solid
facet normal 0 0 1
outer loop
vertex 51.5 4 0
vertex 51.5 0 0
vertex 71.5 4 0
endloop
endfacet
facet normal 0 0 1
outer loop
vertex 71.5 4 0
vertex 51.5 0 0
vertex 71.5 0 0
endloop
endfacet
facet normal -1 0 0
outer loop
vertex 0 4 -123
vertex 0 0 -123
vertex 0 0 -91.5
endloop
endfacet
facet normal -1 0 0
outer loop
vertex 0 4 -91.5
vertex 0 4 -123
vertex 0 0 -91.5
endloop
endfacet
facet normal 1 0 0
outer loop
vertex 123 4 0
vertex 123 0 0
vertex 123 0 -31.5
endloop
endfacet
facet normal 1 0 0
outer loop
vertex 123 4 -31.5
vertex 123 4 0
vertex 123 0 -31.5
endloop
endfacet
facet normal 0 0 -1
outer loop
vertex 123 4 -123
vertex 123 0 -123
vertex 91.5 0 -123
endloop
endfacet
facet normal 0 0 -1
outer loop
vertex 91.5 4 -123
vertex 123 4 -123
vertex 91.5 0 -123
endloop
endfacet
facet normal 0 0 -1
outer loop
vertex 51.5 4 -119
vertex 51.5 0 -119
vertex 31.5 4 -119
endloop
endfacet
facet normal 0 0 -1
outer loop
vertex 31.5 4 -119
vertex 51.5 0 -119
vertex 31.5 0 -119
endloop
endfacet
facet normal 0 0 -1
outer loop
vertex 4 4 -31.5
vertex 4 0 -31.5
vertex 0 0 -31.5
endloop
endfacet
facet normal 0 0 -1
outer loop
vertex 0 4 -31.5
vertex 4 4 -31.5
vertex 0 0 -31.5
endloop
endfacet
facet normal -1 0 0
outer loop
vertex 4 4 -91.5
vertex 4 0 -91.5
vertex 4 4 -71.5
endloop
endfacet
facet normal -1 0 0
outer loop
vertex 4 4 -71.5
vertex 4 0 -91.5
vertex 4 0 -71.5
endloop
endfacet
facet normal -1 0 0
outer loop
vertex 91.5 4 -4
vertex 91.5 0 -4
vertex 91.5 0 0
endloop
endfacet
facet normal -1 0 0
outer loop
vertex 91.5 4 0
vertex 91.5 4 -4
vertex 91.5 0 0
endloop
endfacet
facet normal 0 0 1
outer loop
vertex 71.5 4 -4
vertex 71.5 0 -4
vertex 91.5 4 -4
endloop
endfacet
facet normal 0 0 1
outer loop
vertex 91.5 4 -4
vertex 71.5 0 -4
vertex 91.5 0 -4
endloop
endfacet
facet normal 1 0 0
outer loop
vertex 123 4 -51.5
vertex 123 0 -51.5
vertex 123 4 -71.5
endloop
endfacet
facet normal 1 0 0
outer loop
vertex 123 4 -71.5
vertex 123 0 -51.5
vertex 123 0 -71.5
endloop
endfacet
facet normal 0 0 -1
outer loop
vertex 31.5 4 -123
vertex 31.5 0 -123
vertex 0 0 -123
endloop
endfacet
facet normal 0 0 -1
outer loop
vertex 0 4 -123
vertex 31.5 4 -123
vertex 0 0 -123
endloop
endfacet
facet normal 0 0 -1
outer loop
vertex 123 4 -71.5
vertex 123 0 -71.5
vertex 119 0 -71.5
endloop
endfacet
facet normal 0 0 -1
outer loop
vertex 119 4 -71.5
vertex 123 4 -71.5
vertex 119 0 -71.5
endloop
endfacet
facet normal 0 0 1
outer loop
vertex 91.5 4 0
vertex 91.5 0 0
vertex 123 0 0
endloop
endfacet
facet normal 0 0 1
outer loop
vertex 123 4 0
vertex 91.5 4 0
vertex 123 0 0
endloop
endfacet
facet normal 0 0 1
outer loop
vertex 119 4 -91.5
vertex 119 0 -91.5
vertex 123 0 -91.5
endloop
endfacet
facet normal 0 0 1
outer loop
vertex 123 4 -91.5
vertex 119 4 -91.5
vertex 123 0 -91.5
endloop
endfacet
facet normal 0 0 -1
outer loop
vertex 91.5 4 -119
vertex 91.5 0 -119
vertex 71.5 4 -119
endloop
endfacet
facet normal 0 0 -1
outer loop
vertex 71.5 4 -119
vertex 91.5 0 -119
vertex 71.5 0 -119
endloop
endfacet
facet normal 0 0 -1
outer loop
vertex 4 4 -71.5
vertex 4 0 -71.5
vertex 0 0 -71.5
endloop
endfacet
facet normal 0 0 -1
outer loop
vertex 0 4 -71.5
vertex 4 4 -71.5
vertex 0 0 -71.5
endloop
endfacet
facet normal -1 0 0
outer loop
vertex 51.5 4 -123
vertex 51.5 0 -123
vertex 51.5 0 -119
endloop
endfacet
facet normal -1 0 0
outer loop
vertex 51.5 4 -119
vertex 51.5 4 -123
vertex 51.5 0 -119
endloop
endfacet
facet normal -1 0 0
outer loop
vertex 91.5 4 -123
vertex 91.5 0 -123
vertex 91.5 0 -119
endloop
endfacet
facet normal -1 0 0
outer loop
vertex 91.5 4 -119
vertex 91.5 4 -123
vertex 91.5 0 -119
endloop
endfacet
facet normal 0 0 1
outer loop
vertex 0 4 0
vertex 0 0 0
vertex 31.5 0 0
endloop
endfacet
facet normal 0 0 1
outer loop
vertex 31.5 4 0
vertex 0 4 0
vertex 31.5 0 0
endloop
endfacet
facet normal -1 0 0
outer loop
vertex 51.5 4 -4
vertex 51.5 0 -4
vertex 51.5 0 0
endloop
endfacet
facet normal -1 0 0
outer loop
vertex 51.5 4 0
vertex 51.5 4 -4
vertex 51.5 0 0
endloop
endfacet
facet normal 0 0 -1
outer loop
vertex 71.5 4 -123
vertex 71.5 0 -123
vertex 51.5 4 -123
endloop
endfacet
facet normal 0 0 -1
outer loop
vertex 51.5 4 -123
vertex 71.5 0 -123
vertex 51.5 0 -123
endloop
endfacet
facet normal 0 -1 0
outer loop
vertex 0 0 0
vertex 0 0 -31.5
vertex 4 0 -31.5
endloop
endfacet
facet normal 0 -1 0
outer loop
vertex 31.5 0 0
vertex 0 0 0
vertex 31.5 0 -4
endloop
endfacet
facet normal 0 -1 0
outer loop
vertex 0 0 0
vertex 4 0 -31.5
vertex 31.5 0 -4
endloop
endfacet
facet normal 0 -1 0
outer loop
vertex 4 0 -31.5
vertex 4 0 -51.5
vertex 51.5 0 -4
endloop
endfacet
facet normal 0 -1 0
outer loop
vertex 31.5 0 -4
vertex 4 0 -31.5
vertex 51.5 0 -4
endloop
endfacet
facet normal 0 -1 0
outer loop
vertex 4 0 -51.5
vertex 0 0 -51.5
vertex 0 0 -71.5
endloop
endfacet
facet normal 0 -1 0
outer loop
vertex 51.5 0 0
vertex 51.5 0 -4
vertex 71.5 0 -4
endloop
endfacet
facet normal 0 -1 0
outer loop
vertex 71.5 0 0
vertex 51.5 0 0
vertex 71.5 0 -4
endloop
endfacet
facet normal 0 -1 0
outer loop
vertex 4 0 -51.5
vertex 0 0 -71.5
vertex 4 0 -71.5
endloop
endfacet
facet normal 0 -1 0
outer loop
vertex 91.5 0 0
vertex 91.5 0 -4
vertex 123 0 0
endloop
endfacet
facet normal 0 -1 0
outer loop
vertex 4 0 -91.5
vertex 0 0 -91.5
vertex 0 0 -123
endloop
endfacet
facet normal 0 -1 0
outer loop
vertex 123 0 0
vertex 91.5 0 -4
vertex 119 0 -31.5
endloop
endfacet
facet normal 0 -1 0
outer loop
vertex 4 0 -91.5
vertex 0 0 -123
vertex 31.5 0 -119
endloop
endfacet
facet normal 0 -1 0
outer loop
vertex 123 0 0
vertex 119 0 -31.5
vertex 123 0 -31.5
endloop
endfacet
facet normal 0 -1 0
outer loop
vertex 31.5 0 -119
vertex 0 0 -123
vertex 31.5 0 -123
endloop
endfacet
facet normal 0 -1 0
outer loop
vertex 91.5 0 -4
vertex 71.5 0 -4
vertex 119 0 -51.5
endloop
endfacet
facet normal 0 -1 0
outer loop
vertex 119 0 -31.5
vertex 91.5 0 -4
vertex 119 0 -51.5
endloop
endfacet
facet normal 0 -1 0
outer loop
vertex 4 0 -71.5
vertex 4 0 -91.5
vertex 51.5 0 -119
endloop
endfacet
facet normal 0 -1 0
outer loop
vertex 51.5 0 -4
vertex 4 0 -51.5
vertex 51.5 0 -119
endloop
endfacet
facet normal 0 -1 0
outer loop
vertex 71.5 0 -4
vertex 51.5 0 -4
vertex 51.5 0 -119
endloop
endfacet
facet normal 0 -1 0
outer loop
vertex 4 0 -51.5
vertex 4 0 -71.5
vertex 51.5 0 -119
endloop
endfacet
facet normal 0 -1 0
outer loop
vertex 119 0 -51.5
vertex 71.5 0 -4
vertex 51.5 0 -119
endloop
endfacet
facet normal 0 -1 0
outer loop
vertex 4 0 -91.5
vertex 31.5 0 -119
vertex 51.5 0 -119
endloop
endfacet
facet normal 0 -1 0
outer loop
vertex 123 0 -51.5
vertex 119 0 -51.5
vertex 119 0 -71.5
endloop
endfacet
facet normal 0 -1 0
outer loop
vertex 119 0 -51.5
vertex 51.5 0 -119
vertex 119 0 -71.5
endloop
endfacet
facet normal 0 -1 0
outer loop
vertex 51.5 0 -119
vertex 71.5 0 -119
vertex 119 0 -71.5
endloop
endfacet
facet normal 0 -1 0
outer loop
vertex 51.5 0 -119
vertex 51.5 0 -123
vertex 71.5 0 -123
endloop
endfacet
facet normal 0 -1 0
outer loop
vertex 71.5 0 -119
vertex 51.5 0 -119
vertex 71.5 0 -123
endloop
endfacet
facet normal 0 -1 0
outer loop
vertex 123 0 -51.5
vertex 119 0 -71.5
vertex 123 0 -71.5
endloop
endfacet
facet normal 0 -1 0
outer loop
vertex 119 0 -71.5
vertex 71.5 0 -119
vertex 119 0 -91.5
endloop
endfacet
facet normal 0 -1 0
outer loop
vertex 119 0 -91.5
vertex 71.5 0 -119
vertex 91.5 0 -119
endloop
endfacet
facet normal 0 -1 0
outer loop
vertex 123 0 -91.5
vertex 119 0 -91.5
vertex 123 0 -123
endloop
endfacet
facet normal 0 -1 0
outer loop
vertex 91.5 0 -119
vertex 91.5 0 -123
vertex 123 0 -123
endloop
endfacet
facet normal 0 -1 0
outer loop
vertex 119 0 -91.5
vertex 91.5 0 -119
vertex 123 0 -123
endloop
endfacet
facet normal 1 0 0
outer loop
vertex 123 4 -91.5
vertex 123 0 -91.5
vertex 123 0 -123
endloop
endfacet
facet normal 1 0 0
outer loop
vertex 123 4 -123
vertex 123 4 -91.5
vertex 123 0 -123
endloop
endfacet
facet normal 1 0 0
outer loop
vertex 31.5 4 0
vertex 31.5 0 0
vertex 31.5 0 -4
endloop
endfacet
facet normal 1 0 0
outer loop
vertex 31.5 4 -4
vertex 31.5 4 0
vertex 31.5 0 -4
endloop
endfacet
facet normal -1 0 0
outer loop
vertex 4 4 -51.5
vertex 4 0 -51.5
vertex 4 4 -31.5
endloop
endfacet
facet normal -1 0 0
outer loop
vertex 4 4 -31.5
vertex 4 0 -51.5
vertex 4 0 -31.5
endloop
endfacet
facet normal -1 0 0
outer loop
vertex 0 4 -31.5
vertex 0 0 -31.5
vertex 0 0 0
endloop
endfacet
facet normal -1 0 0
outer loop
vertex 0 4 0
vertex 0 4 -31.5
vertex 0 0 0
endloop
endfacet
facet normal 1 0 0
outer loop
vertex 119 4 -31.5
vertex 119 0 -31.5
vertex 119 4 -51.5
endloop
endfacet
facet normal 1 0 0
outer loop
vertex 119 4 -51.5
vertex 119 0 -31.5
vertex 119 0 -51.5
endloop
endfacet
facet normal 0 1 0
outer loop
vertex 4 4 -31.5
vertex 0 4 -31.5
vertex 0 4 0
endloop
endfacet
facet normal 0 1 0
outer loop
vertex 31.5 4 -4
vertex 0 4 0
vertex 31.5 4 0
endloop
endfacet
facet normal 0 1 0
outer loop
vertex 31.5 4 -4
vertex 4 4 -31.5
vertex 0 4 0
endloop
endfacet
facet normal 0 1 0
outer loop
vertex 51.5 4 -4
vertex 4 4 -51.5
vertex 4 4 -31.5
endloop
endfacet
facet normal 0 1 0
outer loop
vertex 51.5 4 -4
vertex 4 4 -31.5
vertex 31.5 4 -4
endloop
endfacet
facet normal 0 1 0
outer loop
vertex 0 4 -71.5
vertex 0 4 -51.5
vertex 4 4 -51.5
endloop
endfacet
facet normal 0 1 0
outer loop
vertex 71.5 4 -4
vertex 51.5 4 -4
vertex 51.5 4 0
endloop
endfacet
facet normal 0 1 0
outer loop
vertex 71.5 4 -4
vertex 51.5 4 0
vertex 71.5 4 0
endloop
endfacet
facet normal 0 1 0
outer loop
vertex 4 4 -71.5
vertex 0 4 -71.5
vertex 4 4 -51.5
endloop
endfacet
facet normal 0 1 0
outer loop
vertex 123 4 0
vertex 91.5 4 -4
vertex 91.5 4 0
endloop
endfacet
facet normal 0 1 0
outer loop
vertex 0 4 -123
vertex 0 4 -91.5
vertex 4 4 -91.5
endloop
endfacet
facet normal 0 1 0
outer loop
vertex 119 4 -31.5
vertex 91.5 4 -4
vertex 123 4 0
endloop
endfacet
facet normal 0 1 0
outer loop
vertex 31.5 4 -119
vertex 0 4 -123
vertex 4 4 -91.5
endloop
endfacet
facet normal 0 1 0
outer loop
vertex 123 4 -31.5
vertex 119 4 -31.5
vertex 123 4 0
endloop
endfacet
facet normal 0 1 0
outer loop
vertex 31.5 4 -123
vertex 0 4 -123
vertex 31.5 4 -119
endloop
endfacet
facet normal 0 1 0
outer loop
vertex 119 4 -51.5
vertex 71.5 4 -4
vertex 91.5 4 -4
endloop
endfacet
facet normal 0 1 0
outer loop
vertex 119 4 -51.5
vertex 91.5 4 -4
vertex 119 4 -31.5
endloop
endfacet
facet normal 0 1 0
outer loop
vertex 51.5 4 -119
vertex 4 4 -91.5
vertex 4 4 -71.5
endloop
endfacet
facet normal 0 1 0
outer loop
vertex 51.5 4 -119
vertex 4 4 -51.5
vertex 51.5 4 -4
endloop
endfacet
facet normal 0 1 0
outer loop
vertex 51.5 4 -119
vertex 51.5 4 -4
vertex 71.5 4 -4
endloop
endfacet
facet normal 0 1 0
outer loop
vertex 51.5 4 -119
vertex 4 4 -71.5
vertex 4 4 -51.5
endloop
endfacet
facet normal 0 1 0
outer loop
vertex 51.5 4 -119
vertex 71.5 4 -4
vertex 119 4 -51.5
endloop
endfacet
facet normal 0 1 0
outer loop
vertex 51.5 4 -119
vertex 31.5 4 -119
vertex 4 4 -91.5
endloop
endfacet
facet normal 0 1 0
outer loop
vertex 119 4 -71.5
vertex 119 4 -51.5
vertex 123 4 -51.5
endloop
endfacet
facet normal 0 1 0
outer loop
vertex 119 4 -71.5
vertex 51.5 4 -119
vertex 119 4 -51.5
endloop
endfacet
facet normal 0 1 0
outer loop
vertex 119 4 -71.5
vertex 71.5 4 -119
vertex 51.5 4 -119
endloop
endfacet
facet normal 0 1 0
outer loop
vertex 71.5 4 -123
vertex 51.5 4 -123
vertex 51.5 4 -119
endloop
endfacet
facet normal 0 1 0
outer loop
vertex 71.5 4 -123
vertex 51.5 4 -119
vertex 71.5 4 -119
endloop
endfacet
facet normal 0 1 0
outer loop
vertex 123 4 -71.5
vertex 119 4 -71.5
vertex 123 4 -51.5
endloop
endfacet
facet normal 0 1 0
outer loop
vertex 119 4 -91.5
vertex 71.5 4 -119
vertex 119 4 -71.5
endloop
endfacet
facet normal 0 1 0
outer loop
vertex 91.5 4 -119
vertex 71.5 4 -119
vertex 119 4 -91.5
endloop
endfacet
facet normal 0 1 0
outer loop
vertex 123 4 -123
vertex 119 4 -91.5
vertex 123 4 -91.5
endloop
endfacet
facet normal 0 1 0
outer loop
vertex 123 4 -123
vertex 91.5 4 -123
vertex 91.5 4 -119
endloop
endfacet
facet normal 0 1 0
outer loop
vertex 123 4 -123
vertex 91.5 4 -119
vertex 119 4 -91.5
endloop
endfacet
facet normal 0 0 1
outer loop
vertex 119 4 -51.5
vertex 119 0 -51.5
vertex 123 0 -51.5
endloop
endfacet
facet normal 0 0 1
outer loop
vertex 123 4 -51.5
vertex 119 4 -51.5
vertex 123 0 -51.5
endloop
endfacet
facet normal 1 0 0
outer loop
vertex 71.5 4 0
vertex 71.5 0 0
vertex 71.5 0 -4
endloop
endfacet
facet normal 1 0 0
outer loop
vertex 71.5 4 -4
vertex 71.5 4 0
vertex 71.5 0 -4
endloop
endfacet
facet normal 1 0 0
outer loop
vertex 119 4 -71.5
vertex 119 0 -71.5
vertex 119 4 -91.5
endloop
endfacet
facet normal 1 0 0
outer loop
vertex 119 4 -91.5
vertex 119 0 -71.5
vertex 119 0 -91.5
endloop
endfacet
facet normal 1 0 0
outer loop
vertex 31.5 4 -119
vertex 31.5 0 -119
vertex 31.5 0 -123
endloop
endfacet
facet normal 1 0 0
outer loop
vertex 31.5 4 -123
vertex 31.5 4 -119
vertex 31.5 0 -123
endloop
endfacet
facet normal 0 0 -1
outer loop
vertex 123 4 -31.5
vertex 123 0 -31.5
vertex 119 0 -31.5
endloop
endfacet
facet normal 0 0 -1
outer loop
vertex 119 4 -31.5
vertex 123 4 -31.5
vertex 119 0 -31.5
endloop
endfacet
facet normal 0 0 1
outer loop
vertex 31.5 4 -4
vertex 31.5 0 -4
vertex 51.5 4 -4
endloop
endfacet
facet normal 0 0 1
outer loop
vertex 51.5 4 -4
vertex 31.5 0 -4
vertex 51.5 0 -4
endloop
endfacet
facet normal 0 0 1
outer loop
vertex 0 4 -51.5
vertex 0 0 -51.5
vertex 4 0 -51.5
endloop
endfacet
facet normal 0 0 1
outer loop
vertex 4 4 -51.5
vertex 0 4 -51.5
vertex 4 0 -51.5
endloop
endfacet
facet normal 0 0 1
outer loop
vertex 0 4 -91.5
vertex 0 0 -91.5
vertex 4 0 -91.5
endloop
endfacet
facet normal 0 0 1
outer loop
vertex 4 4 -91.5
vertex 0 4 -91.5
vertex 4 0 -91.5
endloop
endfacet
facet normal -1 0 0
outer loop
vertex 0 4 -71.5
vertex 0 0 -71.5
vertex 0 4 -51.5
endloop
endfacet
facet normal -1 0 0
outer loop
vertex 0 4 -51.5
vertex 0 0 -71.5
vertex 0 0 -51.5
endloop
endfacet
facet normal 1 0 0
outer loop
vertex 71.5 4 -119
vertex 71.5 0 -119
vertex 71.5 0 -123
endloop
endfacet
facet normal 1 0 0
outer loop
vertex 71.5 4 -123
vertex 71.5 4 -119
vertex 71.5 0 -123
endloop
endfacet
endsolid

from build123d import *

# Parameters (mm, degrees)
EXTRUDE_1_DEPTH = 4


with BuildPart() as part:
    # Эскиз1 → Бобышка-Вытянуть1 (new body)
    with BuildSketch(Plane(origin=(0, 0, 0), x_dir=(1, 0, 0), z_dir=(0, 1, 0))):
        Polygon((31.5, 0), (31.5, 4), (51.5, 4), (51.5, 0), (71.5, 0), (71.5, 4), (91.5, 4), (91.5, 0), (123, 0), (123, 31.5), (119, 31.5), (119, 51.5), (123, 51.5), (123, 71.5), (119, 71.5), (119, 91.5), (123, 91.5), (123, 123), (91.5, 123), (91.5, 119), (71.5, 119), (71.5, 123), (51.5, 123), (51.5, 119), (31.5, 119), (31.5, 123), (0, 123), (0, 91.5), (4, 91.5), (4, 71.5), (0, 71.5), (0, 51.5), (4, 51.5), (4, 31.5), (0, 31.5), (0, 0), align=None)
    extrude(amount=EXTRUDE_1_DEPTH)


solid = part.part
